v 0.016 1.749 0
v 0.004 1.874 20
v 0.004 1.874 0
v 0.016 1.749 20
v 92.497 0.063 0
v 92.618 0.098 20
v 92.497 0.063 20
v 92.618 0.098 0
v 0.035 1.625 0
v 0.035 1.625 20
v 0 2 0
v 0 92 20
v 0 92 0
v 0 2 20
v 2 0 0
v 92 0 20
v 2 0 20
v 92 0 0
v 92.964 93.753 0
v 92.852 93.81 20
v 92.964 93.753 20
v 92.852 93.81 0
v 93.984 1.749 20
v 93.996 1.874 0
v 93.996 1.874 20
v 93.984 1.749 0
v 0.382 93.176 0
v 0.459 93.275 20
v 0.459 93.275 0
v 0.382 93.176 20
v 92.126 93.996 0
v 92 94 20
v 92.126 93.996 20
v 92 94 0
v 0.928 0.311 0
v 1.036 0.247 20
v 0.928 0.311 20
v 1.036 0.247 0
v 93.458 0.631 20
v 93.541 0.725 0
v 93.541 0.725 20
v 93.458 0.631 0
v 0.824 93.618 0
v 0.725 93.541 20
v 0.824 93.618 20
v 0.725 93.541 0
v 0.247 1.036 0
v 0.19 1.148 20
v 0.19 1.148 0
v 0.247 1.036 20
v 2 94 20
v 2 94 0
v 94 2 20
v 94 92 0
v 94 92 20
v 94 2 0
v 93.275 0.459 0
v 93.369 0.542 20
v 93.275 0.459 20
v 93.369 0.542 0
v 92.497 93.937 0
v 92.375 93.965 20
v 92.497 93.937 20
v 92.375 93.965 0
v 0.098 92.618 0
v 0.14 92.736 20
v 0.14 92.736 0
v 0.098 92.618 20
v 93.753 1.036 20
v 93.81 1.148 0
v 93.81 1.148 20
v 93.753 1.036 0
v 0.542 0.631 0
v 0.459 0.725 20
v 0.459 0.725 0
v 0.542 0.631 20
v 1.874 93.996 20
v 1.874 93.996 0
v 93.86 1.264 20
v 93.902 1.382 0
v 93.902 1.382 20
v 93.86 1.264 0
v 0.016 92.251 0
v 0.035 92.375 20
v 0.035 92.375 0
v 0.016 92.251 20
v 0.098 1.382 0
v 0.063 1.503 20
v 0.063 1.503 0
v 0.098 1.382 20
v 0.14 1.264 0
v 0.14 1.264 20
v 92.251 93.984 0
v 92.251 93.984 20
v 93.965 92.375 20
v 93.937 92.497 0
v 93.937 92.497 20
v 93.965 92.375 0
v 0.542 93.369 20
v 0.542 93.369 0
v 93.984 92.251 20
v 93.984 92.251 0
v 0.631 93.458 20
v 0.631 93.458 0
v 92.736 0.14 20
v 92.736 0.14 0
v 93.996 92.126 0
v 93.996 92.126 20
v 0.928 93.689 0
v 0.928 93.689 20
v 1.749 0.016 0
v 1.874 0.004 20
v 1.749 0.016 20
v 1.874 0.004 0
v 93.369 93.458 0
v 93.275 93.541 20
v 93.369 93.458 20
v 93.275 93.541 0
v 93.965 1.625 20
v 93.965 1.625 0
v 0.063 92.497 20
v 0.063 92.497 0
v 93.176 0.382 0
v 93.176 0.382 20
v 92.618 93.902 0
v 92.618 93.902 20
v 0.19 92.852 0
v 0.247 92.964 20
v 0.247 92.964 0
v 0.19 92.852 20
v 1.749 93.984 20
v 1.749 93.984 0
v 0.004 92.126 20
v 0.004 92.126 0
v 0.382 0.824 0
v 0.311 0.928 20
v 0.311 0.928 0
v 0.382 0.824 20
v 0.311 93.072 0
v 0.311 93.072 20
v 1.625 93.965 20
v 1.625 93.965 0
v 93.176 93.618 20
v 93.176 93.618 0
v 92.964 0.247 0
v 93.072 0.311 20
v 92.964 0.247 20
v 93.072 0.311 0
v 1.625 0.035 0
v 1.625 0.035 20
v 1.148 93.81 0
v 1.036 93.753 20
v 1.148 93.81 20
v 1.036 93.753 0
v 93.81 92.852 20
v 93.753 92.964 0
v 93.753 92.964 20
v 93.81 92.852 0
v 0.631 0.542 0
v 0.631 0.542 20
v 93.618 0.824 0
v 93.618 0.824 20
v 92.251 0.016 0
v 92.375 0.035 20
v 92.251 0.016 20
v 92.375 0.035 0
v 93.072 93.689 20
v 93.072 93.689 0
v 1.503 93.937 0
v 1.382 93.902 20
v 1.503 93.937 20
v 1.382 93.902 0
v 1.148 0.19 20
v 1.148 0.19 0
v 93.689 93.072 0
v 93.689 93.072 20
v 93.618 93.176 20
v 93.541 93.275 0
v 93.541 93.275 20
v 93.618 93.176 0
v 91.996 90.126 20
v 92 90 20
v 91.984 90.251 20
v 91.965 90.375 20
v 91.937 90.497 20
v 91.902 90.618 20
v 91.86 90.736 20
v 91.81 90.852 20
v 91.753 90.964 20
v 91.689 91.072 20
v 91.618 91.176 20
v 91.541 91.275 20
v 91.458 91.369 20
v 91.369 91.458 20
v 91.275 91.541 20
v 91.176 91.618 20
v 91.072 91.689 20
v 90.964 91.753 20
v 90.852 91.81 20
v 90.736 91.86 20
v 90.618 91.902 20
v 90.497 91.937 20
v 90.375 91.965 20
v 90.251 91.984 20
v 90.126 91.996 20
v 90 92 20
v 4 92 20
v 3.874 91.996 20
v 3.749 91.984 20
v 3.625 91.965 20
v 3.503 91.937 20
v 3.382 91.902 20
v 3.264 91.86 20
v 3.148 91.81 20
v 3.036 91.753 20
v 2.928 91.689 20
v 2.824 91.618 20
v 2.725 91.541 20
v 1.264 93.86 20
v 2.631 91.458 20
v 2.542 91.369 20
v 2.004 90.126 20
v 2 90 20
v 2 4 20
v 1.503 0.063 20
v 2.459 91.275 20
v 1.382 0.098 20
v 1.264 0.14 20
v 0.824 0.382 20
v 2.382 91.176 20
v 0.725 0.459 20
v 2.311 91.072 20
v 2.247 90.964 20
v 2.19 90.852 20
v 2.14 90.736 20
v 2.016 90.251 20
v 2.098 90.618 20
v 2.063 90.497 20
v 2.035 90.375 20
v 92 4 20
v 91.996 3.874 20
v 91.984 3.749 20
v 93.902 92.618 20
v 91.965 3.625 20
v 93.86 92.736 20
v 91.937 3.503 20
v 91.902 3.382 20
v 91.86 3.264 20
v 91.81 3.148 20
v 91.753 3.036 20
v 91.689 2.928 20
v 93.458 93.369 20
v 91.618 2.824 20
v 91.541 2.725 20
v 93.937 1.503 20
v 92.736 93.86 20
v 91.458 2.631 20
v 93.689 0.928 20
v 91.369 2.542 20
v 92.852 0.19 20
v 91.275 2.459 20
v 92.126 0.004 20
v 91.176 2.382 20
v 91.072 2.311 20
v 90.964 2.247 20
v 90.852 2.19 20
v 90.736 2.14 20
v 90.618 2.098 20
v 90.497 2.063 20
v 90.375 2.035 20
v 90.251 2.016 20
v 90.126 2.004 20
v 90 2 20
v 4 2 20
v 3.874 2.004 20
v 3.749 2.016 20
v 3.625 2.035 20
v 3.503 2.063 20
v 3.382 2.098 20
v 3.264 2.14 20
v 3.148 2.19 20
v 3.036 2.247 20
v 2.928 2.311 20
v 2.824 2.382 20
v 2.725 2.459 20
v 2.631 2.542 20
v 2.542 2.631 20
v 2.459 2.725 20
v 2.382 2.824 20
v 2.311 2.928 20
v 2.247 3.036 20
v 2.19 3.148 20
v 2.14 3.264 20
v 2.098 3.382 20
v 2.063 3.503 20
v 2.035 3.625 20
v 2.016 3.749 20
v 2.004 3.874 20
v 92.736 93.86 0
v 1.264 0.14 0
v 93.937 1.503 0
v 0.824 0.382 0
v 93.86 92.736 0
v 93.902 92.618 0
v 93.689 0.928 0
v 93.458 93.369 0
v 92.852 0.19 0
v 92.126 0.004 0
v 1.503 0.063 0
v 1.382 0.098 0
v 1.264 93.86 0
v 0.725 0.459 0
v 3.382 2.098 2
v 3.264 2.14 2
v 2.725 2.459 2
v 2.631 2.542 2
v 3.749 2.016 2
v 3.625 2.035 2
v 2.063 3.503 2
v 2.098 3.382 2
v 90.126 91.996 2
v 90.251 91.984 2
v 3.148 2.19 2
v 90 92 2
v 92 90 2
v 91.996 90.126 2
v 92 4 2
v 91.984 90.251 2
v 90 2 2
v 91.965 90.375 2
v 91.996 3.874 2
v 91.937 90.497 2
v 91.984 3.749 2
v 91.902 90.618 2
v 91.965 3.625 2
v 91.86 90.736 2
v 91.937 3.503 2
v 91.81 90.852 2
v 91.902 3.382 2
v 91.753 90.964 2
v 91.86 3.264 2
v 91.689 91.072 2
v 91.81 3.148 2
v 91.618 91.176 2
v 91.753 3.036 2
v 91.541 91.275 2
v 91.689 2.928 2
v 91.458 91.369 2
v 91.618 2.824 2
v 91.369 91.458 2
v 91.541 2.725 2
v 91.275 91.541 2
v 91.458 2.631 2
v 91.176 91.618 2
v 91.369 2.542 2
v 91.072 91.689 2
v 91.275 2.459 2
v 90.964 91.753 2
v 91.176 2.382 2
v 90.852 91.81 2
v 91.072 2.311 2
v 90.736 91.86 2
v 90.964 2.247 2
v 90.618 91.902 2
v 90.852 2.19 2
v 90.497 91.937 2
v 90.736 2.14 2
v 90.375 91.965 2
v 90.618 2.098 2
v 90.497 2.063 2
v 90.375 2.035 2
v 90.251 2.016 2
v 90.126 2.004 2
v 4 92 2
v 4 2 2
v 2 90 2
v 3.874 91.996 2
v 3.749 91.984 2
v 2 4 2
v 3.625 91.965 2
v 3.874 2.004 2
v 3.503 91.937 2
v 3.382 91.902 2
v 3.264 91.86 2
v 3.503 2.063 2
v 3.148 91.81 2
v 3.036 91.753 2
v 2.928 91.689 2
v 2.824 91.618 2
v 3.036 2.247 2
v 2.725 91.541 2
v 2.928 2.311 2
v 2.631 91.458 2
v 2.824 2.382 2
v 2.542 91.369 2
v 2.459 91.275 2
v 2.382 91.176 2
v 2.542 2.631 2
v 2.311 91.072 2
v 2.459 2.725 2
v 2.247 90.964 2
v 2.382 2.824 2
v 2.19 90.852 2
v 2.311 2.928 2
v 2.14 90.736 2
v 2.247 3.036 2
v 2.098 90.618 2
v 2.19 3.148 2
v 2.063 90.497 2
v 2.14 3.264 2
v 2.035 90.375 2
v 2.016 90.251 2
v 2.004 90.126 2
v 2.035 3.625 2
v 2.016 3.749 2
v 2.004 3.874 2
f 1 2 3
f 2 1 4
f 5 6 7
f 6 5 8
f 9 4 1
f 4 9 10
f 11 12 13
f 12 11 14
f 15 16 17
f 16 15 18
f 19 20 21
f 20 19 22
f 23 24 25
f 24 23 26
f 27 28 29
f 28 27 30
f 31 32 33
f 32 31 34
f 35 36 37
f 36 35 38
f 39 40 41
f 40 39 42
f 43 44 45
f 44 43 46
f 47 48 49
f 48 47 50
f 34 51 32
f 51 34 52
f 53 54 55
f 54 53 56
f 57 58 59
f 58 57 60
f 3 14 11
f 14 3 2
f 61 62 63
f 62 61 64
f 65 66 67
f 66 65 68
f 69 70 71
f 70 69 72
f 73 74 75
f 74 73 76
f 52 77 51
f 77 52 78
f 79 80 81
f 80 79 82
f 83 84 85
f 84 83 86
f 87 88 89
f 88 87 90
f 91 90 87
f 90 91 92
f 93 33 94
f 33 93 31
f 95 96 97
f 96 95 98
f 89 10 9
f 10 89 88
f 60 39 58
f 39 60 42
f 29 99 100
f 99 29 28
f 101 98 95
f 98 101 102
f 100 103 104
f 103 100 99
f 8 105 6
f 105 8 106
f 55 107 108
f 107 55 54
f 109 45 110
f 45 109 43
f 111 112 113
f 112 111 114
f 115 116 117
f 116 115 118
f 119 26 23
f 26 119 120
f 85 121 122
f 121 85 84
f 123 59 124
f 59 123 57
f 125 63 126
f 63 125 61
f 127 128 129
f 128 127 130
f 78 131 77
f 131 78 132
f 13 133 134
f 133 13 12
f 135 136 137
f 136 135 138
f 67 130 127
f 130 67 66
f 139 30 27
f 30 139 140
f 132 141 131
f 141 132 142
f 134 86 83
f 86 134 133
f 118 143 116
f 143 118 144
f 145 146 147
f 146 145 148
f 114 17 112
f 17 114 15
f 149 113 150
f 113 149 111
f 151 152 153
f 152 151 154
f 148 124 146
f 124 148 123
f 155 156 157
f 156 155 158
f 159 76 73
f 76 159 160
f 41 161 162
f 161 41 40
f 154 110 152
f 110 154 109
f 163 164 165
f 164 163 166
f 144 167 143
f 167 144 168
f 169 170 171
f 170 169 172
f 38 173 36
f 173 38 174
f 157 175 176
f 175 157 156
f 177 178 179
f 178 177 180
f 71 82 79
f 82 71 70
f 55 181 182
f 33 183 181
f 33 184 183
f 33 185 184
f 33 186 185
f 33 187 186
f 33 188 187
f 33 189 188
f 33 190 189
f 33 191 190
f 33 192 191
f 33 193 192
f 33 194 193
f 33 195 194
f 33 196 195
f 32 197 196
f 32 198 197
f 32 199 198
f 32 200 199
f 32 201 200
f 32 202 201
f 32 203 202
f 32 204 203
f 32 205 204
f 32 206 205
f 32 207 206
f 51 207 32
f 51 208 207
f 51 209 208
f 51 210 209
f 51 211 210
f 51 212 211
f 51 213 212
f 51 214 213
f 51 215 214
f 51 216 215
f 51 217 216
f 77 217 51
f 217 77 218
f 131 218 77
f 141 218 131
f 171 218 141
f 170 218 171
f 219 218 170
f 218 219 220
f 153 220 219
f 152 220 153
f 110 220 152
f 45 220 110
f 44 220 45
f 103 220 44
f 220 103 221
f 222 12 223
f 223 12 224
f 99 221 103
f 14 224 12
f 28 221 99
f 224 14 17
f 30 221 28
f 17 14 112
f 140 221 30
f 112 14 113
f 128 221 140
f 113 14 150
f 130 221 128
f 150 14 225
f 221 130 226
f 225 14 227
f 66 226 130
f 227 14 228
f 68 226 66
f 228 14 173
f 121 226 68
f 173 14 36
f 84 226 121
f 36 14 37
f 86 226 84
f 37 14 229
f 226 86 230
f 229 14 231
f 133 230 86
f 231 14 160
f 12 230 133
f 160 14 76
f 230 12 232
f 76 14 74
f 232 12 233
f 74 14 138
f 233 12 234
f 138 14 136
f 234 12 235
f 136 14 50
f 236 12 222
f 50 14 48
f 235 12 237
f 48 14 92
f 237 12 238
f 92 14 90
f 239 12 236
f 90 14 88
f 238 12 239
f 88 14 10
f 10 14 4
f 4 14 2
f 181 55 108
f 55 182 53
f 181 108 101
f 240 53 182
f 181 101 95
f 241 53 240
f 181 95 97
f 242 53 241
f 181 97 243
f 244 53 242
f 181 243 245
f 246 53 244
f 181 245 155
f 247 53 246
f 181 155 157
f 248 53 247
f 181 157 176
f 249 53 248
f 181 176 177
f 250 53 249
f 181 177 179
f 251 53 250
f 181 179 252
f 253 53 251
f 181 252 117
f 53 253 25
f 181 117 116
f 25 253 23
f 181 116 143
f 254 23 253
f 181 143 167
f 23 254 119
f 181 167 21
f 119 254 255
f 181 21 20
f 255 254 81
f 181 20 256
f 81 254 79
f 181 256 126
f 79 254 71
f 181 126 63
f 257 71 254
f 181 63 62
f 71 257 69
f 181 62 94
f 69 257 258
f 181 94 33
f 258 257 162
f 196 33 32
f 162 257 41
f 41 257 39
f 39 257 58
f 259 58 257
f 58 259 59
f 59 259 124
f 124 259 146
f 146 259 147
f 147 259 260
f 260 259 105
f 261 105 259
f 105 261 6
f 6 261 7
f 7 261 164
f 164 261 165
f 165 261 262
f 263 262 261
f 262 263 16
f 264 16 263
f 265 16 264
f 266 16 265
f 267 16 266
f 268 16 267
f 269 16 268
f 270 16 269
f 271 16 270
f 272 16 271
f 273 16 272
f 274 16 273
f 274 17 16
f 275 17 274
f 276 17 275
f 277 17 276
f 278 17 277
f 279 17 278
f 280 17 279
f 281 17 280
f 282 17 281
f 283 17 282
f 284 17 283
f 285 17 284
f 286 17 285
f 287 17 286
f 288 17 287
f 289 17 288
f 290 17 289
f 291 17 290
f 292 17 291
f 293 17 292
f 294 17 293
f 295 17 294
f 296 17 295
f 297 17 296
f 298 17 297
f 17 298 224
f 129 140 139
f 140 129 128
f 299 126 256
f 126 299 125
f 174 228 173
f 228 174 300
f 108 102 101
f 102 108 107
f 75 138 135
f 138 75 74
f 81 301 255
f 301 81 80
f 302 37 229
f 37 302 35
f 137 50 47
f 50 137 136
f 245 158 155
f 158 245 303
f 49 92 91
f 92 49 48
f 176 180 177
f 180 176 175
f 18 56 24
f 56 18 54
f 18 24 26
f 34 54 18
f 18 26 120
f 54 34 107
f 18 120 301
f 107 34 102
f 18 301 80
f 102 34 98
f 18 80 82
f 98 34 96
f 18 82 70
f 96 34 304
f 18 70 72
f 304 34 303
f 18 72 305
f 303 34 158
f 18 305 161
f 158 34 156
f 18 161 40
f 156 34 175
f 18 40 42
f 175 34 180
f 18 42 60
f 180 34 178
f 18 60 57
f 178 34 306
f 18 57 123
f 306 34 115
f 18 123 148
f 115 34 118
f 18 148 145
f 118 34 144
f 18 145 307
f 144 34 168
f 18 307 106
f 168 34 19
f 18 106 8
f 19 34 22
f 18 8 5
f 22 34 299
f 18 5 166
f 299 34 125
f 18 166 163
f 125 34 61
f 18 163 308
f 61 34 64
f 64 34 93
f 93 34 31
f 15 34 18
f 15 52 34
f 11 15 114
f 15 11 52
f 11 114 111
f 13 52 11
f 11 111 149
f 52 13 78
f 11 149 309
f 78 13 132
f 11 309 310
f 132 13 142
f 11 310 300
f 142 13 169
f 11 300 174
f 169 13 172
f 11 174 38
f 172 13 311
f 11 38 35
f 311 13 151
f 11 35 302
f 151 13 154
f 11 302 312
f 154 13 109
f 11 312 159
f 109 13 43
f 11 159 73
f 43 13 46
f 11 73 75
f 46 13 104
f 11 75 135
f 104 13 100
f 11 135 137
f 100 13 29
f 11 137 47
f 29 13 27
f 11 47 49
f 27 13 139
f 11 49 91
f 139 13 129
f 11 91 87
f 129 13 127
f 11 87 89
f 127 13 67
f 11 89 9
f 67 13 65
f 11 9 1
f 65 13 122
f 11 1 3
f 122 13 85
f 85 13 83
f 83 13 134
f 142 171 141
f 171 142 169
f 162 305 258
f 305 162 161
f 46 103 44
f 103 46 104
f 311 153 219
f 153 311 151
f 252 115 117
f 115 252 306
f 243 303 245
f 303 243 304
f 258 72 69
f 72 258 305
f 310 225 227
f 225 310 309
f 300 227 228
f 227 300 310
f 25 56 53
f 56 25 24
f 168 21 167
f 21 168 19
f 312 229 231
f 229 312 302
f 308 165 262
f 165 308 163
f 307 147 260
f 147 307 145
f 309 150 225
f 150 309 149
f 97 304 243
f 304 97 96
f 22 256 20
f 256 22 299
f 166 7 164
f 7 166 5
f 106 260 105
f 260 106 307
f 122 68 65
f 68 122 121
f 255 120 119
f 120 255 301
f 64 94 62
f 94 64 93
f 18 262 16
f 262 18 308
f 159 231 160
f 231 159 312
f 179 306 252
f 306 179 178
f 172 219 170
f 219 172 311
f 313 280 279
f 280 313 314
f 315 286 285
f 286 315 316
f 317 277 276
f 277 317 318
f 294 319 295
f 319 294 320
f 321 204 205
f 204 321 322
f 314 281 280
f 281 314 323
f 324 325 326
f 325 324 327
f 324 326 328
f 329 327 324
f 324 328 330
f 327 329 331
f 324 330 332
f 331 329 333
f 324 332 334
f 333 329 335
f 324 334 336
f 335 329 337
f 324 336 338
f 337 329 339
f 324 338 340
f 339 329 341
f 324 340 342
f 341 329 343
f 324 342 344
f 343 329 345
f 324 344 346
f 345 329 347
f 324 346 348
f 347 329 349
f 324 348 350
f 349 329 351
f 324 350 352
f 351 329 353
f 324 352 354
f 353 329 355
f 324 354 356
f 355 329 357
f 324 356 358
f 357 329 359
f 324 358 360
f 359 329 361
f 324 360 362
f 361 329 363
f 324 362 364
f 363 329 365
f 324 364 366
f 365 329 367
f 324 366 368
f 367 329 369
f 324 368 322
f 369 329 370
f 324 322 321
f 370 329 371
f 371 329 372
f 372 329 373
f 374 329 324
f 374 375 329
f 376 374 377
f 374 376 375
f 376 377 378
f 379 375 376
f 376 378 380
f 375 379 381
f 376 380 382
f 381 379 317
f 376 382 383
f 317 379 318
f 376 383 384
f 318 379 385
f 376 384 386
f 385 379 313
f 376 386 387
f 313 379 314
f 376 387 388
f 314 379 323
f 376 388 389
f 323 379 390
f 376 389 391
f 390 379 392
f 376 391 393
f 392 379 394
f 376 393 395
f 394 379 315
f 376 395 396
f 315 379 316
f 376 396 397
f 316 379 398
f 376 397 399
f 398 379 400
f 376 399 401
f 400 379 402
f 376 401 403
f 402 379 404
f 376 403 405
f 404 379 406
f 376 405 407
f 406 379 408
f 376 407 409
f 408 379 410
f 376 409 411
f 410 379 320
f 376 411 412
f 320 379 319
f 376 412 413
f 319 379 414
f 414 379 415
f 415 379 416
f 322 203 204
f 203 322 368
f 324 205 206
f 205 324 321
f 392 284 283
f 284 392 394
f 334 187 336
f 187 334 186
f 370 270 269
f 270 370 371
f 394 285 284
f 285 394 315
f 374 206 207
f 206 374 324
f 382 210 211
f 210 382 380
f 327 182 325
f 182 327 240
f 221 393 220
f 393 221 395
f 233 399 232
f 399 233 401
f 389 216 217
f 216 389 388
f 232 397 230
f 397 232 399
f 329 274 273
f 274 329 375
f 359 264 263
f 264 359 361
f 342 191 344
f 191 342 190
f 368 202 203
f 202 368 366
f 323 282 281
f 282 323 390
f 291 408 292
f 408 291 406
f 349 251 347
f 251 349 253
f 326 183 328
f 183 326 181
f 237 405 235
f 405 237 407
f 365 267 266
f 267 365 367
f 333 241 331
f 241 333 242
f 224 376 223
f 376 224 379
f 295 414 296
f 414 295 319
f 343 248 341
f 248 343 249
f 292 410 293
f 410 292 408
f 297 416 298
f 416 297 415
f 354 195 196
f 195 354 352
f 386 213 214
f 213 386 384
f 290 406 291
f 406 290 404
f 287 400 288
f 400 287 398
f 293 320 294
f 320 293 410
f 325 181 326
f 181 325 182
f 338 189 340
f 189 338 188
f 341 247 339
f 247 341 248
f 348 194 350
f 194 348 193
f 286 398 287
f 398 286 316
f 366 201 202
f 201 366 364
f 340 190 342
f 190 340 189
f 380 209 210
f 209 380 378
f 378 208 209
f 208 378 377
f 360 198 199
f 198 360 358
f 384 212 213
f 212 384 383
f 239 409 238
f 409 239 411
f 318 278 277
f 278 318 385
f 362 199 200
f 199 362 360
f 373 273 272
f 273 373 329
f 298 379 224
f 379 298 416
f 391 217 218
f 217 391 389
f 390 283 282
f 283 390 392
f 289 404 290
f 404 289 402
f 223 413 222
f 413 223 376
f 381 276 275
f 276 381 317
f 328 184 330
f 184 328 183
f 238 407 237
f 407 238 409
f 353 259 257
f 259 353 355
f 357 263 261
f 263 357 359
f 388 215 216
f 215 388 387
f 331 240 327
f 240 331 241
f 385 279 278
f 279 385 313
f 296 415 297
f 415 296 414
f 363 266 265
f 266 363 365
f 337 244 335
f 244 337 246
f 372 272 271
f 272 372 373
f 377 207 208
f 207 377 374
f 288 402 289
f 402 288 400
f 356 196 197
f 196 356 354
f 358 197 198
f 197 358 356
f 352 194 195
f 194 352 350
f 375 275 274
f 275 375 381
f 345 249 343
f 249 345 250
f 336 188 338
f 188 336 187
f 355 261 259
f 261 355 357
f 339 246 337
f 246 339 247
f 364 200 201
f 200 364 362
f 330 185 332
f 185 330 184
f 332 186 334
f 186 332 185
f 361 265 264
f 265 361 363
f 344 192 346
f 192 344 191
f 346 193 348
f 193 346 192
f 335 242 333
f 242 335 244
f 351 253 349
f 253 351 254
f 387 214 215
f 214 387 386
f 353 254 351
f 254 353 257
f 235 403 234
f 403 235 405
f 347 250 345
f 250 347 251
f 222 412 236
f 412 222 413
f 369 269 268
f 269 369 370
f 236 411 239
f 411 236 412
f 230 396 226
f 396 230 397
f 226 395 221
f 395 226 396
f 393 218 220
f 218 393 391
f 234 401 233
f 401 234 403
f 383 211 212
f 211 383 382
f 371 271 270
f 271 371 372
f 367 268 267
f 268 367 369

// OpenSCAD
// file: template.scad
module _rounded_box(dim, r)
{
  //%cube(dim);
  hull()
  {
    for(dx=[r, dim[0]-r])
      for(dy=[r, dim[1]-r])
        translate([dx, dy, 0])
          cylinder(r=r, h=dim[2], $fn=100);
  }
}


module minibox(dim, r, wall)
{
  difference()
  {
    _rounded_box(dim, r);
    translate(wall*[1,1,1])
      _rounded_box(dim-2*wall*[1,1,0], r);
  }
}


minibox([30, 20, 10], 2, 2);
// main file
use <template.scad>

wall=2;
minibox((90+2*wall)*[1,1,0]+[0,0,20], r=2, wall=wall);
